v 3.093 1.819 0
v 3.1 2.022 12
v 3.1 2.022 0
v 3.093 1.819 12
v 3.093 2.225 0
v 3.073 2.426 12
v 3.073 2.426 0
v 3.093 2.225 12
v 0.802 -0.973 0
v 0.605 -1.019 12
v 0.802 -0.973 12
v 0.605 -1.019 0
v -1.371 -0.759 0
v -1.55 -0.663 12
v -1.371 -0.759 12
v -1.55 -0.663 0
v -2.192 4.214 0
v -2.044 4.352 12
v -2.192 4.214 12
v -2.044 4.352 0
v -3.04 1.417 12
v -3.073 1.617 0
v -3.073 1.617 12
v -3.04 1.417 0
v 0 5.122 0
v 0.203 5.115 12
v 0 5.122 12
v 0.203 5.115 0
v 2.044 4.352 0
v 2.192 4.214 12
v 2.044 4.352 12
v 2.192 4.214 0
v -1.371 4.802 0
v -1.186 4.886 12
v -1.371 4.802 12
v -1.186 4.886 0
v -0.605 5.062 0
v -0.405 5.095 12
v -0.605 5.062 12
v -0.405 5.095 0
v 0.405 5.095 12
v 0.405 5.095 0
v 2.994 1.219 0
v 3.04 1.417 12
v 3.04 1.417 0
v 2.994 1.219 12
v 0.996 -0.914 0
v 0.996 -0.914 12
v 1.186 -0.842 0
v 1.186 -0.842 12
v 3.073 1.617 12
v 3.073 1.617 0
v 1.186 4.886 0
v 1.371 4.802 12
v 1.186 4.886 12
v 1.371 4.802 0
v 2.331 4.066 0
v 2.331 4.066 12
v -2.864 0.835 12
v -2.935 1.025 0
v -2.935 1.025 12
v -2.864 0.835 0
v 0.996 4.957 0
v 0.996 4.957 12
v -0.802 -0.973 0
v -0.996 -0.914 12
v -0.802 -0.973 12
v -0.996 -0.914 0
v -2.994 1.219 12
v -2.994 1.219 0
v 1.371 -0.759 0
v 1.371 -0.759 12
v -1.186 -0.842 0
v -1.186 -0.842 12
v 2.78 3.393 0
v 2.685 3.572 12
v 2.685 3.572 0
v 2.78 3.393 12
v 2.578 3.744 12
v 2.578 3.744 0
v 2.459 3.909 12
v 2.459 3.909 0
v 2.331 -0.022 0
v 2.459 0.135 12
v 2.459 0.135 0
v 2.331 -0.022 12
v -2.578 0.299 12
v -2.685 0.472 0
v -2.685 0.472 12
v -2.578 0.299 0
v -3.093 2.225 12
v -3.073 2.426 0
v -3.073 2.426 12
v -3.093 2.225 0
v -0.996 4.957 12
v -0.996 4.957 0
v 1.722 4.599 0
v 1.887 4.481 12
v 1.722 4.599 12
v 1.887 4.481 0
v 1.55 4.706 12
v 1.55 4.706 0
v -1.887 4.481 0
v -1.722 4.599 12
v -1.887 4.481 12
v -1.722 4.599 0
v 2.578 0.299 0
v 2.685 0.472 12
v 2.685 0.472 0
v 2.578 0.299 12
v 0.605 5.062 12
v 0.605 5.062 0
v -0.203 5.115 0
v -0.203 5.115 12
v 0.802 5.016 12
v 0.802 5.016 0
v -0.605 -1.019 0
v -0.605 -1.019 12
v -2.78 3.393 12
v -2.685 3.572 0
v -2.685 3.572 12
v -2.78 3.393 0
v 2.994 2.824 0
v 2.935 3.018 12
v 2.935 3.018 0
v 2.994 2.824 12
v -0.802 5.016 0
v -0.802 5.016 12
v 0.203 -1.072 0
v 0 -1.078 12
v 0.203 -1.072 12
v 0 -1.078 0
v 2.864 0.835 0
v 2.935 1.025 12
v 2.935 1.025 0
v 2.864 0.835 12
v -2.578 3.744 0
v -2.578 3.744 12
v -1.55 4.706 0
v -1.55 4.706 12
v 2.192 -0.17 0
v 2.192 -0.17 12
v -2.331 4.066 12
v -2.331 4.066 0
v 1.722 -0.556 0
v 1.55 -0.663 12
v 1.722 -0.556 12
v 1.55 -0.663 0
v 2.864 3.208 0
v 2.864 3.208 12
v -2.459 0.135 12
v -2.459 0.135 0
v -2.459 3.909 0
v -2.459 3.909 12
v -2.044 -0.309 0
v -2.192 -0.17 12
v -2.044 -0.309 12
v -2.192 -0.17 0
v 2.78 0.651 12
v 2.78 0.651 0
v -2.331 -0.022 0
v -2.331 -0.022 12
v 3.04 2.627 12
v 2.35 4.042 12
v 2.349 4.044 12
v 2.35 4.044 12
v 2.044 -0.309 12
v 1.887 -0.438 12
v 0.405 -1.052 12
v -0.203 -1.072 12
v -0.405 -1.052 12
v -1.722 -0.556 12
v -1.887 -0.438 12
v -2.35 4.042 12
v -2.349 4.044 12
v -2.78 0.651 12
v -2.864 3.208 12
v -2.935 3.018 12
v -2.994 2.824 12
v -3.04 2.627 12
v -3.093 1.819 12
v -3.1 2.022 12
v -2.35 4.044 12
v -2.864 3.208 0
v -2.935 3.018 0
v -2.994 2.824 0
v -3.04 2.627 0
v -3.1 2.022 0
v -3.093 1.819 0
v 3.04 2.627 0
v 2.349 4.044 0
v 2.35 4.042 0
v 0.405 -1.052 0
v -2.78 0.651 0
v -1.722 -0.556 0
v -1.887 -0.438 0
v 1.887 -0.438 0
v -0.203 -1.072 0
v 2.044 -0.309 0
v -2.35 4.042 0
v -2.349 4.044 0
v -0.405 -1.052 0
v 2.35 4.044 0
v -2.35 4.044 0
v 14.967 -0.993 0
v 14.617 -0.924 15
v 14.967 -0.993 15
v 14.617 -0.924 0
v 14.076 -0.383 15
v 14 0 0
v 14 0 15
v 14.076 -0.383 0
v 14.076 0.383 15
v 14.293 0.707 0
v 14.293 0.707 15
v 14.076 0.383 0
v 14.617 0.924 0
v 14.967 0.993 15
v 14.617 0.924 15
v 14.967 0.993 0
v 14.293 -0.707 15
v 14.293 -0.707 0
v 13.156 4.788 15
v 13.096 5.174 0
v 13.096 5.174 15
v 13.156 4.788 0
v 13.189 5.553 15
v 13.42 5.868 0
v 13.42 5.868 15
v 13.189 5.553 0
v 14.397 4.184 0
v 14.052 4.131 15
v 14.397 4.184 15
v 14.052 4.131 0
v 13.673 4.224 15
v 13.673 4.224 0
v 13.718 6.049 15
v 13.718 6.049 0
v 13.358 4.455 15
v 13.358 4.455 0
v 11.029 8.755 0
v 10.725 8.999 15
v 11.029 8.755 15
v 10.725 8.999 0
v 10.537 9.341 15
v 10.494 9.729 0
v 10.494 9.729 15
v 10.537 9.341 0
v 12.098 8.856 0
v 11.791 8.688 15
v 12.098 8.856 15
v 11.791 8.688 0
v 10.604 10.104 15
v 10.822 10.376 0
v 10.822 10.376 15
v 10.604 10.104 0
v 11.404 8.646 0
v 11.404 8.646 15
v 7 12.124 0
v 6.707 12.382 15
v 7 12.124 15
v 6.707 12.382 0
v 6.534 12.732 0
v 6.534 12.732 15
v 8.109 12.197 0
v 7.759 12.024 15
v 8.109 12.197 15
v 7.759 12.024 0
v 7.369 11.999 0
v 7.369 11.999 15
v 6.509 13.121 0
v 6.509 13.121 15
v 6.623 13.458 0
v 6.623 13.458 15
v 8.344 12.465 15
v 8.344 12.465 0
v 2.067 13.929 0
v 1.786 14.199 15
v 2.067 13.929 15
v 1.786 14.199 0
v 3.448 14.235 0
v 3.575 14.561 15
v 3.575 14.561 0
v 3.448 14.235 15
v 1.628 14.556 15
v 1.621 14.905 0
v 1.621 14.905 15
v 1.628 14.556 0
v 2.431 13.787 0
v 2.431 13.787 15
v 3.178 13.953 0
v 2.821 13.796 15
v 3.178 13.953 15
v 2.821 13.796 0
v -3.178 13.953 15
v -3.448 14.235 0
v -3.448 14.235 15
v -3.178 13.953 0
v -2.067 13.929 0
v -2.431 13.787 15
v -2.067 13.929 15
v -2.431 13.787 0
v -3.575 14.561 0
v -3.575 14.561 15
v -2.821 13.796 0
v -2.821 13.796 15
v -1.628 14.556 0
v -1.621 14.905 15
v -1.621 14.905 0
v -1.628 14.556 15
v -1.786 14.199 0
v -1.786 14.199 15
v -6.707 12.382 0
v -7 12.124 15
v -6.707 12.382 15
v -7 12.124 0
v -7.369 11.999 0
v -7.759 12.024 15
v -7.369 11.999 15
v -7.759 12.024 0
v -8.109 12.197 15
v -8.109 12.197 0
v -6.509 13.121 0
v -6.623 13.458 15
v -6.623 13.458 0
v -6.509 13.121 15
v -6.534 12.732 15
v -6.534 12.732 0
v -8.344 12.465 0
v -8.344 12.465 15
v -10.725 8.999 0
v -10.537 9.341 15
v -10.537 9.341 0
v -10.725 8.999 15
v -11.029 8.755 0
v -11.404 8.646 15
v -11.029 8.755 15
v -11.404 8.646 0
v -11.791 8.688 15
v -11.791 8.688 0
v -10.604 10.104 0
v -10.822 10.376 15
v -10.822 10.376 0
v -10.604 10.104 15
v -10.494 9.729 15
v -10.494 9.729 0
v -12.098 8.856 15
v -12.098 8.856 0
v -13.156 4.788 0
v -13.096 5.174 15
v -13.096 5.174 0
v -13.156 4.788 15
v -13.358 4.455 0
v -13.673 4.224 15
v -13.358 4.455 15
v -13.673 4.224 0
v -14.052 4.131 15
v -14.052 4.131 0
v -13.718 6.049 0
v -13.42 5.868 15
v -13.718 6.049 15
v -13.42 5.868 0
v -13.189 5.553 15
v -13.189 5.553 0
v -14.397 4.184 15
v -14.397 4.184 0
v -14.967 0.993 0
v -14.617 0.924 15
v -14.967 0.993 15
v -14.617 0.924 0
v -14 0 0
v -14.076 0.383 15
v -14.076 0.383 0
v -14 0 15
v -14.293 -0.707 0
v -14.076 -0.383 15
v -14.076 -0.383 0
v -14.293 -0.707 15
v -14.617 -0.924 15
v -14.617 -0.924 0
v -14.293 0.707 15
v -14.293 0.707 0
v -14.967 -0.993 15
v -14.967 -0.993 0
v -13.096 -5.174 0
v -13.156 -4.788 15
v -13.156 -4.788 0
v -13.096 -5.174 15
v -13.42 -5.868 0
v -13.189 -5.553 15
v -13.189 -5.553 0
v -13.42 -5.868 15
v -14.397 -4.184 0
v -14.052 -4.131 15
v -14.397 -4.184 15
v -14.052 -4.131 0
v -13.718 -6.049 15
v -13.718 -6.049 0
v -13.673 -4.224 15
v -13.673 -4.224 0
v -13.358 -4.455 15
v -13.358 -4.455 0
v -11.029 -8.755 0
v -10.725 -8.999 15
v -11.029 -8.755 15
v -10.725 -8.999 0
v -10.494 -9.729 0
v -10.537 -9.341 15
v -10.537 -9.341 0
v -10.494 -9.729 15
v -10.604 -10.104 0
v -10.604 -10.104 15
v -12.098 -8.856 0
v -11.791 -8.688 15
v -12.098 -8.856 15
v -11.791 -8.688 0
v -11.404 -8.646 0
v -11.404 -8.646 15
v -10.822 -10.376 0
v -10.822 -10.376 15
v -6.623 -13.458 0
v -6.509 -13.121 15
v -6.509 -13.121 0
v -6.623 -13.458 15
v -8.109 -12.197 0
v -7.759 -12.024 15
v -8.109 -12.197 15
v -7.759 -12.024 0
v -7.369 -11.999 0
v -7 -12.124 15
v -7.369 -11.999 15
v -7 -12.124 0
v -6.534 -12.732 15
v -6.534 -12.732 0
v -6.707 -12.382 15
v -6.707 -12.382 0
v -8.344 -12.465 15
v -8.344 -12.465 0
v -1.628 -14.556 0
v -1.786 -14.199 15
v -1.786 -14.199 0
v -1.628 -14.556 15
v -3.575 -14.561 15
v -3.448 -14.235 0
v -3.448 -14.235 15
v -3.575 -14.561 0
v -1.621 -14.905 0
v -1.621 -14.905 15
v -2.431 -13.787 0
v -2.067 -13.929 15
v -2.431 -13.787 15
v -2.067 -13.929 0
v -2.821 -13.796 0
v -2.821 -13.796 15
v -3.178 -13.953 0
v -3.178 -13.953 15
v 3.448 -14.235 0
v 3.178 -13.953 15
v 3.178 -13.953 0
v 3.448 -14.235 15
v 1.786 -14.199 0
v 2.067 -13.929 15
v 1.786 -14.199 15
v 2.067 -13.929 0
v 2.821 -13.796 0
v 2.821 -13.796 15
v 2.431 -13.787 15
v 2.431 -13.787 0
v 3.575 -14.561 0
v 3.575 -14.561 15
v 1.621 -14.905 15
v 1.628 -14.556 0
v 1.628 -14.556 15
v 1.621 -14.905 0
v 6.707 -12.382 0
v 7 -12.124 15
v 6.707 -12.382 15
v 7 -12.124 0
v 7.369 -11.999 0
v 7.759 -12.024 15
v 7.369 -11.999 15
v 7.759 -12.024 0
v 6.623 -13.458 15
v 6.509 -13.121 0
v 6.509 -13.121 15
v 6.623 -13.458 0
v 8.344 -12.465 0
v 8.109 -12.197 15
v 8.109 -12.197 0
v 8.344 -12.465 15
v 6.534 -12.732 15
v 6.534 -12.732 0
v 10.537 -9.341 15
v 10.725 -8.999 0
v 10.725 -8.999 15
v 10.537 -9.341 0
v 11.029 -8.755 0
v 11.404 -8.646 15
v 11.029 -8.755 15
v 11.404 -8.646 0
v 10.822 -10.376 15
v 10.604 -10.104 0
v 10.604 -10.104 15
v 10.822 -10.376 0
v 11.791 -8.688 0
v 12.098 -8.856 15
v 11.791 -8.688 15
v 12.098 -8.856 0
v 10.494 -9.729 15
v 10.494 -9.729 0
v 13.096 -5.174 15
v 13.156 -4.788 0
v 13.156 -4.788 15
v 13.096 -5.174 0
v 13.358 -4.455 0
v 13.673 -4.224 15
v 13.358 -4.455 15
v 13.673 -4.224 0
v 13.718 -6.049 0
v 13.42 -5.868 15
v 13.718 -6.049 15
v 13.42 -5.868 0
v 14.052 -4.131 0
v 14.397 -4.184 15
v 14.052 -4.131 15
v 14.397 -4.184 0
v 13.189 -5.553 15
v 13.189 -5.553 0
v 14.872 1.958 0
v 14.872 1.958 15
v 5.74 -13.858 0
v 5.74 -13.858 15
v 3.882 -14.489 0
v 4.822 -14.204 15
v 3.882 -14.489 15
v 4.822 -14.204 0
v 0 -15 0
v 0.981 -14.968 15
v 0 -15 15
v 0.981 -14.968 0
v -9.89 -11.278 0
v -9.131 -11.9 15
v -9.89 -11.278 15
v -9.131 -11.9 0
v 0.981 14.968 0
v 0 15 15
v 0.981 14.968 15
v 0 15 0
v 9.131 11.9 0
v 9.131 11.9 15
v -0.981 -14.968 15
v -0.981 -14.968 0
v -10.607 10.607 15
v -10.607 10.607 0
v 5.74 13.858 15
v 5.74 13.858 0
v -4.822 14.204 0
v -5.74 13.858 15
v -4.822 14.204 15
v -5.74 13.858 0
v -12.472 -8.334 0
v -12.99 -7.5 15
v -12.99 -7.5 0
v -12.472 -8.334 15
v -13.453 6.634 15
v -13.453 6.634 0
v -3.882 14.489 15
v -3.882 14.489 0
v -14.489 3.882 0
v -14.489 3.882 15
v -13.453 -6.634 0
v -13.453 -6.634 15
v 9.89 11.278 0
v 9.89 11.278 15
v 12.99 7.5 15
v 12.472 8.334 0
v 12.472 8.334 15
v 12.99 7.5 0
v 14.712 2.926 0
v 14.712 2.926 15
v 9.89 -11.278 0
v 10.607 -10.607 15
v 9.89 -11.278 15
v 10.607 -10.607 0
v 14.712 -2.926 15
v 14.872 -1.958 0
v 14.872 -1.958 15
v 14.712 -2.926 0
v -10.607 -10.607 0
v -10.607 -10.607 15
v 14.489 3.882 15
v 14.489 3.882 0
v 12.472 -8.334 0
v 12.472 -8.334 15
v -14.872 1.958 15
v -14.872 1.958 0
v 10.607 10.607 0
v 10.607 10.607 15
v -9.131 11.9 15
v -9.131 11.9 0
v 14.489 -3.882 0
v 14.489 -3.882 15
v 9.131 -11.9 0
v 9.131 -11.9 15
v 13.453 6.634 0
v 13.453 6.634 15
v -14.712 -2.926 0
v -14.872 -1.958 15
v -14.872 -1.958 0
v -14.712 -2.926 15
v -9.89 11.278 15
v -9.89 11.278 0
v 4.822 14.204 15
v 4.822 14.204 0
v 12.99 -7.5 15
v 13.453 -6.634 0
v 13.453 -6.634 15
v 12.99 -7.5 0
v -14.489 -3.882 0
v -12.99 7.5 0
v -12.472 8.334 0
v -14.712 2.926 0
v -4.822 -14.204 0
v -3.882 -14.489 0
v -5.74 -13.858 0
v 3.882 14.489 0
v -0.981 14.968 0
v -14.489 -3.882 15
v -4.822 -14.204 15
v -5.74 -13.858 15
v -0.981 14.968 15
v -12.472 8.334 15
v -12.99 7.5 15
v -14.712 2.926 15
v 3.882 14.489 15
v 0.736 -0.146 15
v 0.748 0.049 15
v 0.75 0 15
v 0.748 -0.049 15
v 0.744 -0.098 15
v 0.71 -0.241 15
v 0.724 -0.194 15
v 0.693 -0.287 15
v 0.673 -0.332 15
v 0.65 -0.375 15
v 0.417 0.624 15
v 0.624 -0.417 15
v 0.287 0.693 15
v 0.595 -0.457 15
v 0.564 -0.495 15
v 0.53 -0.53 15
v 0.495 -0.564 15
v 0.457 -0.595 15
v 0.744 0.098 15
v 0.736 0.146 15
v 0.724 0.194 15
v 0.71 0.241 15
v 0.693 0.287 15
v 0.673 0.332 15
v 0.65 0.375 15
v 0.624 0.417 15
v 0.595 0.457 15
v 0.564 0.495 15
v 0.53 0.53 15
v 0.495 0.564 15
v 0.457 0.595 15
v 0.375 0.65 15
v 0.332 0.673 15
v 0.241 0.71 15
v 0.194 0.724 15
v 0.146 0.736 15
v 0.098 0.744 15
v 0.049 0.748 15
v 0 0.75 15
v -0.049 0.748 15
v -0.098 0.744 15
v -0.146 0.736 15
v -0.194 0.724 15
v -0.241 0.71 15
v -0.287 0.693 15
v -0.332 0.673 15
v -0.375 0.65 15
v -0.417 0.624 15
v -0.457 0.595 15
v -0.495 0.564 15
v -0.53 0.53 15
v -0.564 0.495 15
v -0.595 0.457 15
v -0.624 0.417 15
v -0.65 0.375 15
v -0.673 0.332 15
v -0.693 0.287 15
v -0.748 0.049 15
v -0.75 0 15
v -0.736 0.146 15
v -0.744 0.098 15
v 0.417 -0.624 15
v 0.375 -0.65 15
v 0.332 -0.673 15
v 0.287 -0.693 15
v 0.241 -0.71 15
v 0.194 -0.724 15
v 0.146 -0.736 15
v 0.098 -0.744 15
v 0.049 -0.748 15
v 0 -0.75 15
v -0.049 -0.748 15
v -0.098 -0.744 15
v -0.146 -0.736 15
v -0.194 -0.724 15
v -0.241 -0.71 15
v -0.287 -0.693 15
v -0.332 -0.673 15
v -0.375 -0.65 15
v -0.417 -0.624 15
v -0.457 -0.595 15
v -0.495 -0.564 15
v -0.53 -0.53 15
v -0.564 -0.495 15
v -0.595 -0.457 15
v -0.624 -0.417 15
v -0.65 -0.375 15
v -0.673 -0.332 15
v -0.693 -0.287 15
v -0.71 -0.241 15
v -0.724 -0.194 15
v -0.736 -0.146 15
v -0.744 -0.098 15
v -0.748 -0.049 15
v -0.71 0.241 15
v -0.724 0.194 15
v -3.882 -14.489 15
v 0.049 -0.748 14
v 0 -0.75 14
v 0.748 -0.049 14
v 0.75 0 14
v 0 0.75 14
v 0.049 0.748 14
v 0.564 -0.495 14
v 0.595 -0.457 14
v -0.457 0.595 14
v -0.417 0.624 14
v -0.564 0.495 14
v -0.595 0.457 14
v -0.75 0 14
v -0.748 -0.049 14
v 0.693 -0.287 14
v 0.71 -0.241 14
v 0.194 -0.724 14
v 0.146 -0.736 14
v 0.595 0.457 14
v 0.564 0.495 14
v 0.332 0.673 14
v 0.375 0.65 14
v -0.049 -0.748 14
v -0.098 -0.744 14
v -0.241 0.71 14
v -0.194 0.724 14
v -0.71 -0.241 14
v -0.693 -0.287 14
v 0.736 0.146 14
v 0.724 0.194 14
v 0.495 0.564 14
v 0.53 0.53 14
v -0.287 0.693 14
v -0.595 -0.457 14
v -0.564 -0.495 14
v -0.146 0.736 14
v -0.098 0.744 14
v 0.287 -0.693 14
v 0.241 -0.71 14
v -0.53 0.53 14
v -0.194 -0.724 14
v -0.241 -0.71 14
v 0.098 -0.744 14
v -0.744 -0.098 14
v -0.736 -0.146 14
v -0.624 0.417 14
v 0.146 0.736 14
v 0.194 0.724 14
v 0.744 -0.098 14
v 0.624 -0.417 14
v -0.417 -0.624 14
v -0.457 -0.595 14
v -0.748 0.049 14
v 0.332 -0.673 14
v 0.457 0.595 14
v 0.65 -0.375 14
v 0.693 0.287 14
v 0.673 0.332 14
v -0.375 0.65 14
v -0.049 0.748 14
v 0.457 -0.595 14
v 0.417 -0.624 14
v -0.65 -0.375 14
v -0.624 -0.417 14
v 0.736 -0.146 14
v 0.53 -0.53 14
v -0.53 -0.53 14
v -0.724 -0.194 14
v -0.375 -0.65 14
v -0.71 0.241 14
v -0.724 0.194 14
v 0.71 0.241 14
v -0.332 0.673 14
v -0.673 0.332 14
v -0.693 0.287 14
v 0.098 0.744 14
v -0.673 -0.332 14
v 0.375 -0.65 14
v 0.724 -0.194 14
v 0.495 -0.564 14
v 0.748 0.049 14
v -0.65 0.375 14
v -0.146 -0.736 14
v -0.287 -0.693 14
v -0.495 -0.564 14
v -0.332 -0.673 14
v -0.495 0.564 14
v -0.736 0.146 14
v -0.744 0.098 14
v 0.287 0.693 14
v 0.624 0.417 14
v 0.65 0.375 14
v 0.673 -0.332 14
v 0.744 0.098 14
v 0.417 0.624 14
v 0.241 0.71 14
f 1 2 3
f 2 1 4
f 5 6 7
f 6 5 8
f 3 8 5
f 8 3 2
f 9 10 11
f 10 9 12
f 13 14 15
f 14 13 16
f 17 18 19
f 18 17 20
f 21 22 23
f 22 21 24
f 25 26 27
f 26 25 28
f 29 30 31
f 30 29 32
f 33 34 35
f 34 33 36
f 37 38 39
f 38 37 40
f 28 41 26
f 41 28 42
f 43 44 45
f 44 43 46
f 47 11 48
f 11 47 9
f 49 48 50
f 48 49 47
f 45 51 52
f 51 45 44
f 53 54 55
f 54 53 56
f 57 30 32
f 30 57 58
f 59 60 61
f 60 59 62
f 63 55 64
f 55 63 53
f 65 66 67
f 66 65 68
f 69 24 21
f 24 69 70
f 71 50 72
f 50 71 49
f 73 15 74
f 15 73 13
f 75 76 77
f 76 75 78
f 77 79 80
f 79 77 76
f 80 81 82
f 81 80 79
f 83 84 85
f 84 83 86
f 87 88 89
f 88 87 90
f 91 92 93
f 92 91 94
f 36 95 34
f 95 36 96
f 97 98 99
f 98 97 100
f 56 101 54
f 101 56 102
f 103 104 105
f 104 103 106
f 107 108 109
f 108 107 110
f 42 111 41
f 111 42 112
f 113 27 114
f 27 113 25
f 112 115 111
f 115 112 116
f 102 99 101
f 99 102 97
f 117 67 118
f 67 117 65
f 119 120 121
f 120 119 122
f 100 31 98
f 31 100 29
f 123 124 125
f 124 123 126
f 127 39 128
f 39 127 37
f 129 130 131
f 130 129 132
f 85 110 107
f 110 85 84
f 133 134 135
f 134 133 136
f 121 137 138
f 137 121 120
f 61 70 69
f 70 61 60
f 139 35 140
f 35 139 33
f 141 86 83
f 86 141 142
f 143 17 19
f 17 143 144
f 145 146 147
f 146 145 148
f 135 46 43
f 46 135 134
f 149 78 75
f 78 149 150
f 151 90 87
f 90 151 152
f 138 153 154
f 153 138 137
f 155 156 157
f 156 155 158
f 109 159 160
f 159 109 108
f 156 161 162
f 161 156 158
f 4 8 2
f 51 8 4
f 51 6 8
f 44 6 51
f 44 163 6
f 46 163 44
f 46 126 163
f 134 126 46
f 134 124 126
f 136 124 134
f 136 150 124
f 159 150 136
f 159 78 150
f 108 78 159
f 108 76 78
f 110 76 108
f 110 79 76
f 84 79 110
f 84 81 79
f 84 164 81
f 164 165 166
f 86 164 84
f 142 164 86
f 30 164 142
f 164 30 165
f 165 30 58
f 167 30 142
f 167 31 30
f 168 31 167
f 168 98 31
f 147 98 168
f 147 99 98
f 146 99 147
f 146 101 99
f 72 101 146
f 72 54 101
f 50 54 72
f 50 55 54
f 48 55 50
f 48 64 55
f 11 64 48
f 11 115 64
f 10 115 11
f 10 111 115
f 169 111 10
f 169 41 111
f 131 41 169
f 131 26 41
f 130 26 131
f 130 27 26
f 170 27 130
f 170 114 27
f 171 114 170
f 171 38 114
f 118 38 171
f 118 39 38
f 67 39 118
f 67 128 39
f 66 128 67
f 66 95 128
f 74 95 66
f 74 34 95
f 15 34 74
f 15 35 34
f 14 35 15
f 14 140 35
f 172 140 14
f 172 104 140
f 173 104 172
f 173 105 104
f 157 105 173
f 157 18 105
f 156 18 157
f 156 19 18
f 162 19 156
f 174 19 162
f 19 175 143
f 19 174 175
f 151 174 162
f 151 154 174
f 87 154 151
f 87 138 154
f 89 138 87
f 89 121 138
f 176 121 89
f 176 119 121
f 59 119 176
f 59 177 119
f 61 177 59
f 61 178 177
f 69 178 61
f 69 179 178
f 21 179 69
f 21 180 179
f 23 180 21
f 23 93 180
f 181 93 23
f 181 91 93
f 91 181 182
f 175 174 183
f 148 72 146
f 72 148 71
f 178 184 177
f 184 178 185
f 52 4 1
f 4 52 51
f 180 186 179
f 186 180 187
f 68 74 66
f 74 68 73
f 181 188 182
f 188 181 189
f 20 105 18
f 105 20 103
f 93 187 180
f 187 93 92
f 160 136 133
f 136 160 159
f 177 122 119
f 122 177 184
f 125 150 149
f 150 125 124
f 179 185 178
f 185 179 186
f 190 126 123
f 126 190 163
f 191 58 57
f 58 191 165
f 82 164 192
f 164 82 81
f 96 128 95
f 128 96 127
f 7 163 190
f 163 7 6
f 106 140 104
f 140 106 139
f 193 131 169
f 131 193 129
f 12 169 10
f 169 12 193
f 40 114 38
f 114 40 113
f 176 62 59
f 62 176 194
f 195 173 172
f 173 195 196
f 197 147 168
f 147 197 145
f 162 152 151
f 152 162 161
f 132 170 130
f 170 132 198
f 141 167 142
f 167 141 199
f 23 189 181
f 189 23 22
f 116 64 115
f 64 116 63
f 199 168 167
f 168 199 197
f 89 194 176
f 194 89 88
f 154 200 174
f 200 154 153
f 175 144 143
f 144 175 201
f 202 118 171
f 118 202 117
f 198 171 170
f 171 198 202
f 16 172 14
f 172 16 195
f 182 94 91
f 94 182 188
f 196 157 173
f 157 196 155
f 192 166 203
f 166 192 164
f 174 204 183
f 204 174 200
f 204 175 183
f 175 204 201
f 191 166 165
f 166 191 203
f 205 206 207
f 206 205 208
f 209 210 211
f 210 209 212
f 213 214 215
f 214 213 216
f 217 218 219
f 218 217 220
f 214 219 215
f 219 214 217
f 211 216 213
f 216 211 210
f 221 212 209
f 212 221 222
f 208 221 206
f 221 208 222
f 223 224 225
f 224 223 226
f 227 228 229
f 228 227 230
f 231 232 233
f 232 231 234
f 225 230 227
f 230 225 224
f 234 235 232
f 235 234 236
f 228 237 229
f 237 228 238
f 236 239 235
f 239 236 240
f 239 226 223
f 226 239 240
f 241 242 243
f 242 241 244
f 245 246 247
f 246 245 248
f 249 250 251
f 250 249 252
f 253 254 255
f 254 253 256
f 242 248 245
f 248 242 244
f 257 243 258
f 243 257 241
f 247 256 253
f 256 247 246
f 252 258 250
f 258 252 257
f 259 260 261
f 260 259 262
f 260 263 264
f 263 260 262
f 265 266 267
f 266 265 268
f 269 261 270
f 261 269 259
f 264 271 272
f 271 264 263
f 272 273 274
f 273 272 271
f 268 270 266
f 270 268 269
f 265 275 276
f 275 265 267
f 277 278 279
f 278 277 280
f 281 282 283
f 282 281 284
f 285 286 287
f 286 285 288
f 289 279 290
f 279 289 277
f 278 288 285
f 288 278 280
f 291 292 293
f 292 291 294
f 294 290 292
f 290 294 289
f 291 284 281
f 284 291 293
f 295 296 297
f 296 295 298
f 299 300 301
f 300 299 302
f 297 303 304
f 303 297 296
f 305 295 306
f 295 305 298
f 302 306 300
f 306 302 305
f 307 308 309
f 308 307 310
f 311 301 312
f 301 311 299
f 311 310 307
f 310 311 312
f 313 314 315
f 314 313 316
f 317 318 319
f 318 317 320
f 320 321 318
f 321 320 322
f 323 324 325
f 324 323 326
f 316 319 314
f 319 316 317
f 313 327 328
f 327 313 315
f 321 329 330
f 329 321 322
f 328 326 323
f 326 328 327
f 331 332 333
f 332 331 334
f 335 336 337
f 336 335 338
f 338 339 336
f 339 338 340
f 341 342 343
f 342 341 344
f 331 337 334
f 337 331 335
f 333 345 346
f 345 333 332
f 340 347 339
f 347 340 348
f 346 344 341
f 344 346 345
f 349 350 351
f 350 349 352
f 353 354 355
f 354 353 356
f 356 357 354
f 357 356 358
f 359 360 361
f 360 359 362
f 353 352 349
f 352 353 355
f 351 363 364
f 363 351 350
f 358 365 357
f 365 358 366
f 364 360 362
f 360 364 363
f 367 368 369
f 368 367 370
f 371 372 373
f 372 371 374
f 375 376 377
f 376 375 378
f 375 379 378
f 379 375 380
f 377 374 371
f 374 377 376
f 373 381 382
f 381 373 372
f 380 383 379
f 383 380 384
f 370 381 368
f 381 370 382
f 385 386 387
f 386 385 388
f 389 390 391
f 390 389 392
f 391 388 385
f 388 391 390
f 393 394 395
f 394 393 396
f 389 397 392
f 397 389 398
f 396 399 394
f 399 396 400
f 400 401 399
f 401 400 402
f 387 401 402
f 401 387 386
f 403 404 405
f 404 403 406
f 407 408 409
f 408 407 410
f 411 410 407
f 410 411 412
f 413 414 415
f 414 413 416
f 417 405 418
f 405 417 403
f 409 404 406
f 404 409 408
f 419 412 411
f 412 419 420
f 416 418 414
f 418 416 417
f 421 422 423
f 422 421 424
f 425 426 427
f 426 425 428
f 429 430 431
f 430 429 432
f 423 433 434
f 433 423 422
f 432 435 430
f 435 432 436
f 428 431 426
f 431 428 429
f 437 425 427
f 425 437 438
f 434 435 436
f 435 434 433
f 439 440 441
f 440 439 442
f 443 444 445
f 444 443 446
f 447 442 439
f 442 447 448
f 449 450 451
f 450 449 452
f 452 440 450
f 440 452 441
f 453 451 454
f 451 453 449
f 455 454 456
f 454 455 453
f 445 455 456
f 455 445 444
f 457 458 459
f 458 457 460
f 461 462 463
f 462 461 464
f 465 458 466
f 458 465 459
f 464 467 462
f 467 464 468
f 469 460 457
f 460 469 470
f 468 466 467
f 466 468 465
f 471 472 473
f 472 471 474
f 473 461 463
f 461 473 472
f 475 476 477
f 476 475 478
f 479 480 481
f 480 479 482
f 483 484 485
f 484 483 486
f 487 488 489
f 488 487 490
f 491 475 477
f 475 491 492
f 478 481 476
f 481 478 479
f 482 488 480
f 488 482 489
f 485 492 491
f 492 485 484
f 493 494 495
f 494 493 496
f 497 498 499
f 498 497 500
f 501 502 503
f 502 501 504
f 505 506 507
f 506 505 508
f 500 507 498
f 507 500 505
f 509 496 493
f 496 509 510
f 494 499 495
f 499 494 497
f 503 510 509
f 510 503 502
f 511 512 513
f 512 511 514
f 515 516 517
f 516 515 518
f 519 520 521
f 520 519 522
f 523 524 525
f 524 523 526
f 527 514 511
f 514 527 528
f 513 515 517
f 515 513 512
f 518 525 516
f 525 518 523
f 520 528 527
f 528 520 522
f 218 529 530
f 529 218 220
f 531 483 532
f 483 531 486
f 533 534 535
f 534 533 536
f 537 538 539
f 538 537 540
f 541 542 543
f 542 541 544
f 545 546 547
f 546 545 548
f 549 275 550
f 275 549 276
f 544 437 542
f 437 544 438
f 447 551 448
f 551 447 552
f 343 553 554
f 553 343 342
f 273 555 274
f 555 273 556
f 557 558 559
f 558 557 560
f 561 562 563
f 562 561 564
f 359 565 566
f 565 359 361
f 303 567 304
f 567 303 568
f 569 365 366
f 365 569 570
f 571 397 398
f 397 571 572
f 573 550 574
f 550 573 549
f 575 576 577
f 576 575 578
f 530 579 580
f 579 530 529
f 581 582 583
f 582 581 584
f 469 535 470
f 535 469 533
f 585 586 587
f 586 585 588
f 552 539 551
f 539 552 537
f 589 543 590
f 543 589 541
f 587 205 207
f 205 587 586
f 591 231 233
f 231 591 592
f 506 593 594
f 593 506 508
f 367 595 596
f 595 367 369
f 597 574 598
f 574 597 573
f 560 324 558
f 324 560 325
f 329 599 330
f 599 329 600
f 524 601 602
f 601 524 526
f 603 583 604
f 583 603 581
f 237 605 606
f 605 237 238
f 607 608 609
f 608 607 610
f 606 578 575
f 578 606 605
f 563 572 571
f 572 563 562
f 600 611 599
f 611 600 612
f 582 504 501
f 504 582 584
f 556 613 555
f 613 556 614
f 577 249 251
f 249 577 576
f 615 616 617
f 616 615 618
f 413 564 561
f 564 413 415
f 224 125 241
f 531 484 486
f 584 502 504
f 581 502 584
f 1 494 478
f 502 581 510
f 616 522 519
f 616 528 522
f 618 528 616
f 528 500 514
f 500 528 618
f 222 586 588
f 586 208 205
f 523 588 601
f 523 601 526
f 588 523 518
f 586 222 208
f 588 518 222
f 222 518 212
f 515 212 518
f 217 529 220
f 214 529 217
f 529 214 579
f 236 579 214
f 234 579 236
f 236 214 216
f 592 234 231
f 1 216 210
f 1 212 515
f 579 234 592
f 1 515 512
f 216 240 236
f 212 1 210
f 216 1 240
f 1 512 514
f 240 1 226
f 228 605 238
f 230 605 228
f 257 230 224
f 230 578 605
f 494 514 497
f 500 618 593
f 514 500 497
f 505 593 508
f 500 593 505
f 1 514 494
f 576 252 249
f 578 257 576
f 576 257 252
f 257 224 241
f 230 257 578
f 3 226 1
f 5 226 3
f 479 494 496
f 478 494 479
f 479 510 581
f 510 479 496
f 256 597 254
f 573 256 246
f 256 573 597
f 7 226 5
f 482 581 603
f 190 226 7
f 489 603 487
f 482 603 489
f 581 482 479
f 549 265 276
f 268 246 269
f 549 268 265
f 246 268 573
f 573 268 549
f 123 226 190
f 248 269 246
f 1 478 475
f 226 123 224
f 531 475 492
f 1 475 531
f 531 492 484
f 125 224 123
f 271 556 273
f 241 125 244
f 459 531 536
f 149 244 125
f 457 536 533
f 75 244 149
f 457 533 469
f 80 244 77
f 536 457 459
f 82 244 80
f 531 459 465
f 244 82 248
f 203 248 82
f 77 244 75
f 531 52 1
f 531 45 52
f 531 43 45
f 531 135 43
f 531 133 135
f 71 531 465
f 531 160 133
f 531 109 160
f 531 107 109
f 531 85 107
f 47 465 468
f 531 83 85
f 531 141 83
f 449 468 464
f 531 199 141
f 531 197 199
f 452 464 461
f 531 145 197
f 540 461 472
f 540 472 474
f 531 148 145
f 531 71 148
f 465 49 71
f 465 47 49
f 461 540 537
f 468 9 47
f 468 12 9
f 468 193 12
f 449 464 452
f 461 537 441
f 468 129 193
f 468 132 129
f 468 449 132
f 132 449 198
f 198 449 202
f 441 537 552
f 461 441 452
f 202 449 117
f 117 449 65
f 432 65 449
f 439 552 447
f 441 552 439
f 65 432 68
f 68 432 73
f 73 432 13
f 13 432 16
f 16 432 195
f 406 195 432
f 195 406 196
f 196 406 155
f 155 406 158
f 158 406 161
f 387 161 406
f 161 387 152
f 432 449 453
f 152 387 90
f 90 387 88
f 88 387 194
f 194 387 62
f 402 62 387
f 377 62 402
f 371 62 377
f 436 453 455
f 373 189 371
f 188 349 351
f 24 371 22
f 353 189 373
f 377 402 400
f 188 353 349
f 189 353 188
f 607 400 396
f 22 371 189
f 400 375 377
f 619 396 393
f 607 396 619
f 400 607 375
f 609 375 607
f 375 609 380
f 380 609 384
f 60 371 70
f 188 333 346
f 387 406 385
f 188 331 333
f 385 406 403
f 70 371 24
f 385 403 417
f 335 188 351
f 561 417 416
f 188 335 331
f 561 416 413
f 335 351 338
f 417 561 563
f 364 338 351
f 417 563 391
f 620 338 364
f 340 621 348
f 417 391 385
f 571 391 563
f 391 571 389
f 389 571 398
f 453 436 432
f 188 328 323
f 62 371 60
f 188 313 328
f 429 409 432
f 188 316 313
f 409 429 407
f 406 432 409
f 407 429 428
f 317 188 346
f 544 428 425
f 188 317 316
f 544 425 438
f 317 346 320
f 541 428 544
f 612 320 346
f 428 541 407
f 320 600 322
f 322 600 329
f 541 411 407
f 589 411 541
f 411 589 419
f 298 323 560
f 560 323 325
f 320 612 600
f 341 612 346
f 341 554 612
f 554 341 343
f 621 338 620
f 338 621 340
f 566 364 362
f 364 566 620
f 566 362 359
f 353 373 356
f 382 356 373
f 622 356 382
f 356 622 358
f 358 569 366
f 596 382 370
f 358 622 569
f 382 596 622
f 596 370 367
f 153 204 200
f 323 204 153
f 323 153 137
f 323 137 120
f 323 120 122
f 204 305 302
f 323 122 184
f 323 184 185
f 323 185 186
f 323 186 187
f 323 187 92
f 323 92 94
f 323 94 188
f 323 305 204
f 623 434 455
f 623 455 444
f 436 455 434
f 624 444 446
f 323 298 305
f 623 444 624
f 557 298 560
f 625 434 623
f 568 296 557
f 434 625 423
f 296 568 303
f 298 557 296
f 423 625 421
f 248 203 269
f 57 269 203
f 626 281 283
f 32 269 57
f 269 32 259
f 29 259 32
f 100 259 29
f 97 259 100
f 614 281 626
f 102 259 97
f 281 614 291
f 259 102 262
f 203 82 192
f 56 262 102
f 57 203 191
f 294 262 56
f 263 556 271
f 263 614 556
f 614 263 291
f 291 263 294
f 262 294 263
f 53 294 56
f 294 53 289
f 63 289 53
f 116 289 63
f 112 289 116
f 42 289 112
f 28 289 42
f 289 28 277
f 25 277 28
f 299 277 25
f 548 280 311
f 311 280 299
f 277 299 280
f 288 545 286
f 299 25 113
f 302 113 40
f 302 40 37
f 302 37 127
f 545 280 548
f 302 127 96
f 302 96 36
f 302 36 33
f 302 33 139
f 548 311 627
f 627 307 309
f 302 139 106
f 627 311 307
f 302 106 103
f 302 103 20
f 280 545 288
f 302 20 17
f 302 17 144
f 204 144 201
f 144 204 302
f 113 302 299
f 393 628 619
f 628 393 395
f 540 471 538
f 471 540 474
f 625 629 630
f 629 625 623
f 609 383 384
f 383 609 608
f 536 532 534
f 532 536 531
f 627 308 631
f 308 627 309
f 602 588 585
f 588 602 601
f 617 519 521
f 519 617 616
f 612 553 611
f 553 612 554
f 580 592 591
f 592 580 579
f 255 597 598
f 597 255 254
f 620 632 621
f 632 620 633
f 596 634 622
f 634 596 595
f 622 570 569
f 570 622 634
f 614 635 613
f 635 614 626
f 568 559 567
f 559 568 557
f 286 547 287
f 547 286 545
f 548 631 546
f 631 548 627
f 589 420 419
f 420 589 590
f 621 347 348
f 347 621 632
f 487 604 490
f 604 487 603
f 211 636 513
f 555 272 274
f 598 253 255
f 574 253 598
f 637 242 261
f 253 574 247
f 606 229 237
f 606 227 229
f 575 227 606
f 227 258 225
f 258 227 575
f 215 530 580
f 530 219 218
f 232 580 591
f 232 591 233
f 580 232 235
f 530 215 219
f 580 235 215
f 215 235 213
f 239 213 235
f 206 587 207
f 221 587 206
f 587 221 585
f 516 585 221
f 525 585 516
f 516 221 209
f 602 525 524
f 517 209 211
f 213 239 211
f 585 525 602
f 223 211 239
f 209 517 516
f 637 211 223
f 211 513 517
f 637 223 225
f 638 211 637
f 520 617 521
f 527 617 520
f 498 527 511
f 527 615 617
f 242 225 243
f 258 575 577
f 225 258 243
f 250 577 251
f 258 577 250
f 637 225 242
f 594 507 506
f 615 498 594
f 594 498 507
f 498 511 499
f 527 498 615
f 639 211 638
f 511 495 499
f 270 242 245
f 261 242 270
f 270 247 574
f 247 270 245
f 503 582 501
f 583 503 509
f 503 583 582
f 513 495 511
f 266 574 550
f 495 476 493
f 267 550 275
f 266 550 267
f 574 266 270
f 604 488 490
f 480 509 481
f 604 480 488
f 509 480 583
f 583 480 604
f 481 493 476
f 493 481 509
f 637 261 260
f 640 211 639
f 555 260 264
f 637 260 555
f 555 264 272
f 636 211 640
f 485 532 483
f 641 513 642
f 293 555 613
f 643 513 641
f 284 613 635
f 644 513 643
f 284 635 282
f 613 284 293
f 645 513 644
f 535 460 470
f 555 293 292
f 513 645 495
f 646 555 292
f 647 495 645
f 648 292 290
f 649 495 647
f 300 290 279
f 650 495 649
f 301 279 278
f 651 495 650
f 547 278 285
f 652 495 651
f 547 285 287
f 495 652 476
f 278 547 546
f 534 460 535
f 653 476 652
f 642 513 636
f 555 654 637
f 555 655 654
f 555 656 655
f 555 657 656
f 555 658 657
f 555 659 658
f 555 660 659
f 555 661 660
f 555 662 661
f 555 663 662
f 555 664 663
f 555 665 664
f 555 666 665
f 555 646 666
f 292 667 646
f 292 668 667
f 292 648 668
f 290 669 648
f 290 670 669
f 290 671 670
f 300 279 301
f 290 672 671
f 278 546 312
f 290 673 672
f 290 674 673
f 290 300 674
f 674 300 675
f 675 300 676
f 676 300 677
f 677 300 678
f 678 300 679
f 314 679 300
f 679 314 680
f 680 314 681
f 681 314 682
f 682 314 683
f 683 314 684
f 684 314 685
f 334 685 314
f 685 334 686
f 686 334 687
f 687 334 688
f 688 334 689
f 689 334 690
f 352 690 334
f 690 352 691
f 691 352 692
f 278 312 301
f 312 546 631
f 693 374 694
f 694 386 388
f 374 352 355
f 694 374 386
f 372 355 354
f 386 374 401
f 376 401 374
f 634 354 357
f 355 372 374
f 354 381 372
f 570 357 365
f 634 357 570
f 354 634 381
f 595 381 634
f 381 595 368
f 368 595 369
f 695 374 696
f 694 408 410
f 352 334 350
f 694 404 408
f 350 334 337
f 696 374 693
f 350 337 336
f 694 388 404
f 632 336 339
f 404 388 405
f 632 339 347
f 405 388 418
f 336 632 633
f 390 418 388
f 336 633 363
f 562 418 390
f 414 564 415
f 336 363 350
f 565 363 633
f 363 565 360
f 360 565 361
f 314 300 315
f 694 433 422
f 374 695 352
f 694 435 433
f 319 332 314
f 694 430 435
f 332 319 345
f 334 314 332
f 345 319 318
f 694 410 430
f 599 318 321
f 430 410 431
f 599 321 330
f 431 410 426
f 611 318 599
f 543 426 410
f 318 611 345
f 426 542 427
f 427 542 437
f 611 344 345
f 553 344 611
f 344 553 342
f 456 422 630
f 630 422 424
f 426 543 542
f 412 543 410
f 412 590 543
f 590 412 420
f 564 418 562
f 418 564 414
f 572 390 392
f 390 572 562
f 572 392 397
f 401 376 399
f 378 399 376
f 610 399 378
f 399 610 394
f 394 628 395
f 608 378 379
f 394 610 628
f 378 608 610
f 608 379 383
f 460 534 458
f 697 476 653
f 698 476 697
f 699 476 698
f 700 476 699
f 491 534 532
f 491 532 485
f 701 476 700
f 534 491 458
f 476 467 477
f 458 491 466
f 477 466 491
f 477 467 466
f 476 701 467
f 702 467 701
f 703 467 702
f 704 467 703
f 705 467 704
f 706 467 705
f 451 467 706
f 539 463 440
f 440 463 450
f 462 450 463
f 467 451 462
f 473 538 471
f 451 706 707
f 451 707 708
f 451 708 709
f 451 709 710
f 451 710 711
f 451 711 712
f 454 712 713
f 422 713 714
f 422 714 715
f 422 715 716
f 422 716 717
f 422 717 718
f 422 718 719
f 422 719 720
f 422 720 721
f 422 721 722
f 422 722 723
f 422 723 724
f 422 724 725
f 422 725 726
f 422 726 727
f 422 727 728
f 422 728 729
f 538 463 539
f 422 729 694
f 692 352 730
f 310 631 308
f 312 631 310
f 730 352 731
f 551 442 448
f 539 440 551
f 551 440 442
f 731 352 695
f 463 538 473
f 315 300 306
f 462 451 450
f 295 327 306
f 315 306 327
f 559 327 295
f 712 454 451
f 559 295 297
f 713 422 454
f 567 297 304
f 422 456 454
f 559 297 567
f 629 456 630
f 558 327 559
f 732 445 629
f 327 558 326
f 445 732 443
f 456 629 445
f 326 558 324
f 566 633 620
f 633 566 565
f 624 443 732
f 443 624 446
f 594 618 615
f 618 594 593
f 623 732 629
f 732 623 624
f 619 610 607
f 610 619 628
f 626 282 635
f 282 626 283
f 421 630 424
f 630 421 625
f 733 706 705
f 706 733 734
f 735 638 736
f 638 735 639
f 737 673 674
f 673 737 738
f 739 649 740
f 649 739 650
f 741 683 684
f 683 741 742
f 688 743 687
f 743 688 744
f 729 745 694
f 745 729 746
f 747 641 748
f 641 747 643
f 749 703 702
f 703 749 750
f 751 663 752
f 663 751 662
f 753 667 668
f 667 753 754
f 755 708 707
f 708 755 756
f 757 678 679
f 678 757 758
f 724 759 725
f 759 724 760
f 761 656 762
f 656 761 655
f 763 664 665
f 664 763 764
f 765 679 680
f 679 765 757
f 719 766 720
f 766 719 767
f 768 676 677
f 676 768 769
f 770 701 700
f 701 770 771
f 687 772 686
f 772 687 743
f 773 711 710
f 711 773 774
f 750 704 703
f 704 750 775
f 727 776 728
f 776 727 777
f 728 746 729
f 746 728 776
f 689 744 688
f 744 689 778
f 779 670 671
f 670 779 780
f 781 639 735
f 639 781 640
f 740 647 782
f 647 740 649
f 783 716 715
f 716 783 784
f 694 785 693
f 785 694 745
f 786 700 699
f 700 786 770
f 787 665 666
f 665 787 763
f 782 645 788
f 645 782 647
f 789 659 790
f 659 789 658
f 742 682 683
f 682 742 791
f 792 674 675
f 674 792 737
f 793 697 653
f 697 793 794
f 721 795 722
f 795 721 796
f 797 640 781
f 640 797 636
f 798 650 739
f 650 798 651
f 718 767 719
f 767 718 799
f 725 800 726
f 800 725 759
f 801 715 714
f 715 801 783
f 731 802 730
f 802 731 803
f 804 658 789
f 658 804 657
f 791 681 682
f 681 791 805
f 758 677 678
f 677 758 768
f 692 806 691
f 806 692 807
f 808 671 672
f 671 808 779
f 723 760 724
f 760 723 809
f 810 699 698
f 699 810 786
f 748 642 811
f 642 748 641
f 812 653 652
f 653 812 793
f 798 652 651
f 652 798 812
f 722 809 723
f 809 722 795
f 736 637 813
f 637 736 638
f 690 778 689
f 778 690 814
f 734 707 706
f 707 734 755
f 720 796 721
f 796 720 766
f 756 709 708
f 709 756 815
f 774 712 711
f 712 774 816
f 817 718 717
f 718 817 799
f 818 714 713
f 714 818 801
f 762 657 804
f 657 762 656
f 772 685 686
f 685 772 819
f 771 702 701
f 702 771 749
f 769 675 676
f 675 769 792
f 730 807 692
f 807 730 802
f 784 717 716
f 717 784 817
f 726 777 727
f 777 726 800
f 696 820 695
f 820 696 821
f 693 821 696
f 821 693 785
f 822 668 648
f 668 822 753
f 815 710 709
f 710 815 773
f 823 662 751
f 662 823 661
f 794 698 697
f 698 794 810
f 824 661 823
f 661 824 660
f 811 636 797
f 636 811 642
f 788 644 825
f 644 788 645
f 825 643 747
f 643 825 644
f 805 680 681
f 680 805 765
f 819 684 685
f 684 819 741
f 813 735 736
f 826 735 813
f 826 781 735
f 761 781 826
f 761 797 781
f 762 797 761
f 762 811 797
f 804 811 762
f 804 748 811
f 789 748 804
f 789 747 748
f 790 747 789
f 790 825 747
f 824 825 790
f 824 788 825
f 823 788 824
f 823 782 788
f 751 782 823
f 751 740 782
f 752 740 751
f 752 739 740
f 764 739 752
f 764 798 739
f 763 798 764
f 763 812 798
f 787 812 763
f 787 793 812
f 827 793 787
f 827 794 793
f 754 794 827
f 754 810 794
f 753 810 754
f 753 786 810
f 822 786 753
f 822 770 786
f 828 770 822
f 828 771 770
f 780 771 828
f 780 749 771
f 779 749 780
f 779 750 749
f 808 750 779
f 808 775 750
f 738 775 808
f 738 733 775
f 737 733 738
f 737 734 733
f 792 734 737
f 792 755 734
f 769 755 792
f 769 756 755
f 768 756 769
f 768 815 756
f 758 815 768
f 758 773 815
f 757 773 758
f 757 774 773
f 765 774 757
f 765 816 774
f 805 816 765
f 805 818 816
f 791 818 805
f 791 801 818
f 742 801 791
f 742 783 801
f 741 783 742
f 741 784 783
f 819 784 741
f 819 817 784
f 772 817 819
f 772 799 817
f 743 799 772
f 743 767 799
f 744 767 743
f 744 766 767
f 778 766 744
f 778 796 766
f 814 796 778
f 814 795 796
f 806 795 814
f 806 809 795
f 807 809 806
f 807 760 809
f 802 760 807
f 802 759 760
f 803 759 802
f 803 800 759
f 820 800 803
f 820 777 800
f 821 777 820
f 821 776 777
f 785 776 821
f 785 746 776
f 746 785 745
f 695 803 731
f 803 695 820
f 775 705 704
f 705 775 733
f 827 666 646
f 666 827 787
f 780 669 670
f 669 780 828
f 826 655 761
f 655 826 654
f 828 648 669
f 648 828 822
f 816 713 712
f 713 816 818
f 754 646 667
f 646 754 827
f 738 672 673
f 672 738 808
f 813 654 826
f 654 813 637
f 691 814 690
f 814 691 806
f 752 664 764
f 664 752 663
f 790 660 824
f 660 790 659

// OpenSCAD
// Replacement knob for a hotplate stirrer with a 6 mm D-shaft
// Print orientation: flat bottom face on the bed (z = 0), building up in +Z.
// Placed with the D-flat along +X, so the pointer groove ends up on the -Y side.

$fn = 96;

// ---- Knob body ----
knob_d      = 30;    // outer diameter of the knob
knob_h      = 15;    // overall height of the knob

// ---- D-shaped blind bore (from bottom face, 12 mm deep) ----
bore_d      = 6.2;   // diameter of the circle that makes up the D
bore_depth  = 12;    // depth of the bore from the bottom face
bore_flat   = 4.7;   // distance from the flat side to the opposite side of the circle
eps         = 0.5;   // overshoot so the cut passes cleanly through the bottom face

// ---- Grip grooves ----
groove_n     = 18;   // number of evenly spaced vertical grip grooves
groove_d     = 2;    // diameter of each groove (half-cylinder, centred on the surface)

// ---- Pointer groove ----
pointer_w    = 1.5;  // width of the pointer groove (at the centre)
pointer_d    = 1;    // depth of the pointer groove
pointer_r    = pointer_w / 2;  // radius of the groove circle

// ---- Derived ----
bore_r = bore_d / 2;
// chord length of the flat cut, from circle geometry
bore_chord = sqrt(bore_r * bore_r - (bore_flat / 2) * (bore_flat / 2));

difference() {
    // Main knob body
    cylinder(d = knob_d, h = knob_h);

    // D-shaped blind bore from the bottom face
    translate([0, 0, -eps])
        union() {
            // circular part of the D
            translate([0, bore_chord, 0])
                cylinder(r = bore_r, h = bore_depth + eps);
            // flat slab between the chord and the cut edge
            translate([-bore_flat / 2, bore_chord, 0])
                cube([bore_flat, bore_chord, bore_depth + eps]);
        }

    // Vertical grip grooves, evenly spaced around the outside
    for (i = [0 : groove_n - 1])
        rotate([0, 0, i * 360 / groove_n])
            translate([knob_d / 2, 0, -eps])
                cylinder(d = groove_d, h = knob_h + 2 * eps, $fn = 16);

    // Pointer groove: a 2D circle in the X-Y plane, extruded up from the top face
    translate([0, 0, knob_h - pointer_d])
        linear_extrude(height = pointer_d)
            circle(r = pointer_r);
}
